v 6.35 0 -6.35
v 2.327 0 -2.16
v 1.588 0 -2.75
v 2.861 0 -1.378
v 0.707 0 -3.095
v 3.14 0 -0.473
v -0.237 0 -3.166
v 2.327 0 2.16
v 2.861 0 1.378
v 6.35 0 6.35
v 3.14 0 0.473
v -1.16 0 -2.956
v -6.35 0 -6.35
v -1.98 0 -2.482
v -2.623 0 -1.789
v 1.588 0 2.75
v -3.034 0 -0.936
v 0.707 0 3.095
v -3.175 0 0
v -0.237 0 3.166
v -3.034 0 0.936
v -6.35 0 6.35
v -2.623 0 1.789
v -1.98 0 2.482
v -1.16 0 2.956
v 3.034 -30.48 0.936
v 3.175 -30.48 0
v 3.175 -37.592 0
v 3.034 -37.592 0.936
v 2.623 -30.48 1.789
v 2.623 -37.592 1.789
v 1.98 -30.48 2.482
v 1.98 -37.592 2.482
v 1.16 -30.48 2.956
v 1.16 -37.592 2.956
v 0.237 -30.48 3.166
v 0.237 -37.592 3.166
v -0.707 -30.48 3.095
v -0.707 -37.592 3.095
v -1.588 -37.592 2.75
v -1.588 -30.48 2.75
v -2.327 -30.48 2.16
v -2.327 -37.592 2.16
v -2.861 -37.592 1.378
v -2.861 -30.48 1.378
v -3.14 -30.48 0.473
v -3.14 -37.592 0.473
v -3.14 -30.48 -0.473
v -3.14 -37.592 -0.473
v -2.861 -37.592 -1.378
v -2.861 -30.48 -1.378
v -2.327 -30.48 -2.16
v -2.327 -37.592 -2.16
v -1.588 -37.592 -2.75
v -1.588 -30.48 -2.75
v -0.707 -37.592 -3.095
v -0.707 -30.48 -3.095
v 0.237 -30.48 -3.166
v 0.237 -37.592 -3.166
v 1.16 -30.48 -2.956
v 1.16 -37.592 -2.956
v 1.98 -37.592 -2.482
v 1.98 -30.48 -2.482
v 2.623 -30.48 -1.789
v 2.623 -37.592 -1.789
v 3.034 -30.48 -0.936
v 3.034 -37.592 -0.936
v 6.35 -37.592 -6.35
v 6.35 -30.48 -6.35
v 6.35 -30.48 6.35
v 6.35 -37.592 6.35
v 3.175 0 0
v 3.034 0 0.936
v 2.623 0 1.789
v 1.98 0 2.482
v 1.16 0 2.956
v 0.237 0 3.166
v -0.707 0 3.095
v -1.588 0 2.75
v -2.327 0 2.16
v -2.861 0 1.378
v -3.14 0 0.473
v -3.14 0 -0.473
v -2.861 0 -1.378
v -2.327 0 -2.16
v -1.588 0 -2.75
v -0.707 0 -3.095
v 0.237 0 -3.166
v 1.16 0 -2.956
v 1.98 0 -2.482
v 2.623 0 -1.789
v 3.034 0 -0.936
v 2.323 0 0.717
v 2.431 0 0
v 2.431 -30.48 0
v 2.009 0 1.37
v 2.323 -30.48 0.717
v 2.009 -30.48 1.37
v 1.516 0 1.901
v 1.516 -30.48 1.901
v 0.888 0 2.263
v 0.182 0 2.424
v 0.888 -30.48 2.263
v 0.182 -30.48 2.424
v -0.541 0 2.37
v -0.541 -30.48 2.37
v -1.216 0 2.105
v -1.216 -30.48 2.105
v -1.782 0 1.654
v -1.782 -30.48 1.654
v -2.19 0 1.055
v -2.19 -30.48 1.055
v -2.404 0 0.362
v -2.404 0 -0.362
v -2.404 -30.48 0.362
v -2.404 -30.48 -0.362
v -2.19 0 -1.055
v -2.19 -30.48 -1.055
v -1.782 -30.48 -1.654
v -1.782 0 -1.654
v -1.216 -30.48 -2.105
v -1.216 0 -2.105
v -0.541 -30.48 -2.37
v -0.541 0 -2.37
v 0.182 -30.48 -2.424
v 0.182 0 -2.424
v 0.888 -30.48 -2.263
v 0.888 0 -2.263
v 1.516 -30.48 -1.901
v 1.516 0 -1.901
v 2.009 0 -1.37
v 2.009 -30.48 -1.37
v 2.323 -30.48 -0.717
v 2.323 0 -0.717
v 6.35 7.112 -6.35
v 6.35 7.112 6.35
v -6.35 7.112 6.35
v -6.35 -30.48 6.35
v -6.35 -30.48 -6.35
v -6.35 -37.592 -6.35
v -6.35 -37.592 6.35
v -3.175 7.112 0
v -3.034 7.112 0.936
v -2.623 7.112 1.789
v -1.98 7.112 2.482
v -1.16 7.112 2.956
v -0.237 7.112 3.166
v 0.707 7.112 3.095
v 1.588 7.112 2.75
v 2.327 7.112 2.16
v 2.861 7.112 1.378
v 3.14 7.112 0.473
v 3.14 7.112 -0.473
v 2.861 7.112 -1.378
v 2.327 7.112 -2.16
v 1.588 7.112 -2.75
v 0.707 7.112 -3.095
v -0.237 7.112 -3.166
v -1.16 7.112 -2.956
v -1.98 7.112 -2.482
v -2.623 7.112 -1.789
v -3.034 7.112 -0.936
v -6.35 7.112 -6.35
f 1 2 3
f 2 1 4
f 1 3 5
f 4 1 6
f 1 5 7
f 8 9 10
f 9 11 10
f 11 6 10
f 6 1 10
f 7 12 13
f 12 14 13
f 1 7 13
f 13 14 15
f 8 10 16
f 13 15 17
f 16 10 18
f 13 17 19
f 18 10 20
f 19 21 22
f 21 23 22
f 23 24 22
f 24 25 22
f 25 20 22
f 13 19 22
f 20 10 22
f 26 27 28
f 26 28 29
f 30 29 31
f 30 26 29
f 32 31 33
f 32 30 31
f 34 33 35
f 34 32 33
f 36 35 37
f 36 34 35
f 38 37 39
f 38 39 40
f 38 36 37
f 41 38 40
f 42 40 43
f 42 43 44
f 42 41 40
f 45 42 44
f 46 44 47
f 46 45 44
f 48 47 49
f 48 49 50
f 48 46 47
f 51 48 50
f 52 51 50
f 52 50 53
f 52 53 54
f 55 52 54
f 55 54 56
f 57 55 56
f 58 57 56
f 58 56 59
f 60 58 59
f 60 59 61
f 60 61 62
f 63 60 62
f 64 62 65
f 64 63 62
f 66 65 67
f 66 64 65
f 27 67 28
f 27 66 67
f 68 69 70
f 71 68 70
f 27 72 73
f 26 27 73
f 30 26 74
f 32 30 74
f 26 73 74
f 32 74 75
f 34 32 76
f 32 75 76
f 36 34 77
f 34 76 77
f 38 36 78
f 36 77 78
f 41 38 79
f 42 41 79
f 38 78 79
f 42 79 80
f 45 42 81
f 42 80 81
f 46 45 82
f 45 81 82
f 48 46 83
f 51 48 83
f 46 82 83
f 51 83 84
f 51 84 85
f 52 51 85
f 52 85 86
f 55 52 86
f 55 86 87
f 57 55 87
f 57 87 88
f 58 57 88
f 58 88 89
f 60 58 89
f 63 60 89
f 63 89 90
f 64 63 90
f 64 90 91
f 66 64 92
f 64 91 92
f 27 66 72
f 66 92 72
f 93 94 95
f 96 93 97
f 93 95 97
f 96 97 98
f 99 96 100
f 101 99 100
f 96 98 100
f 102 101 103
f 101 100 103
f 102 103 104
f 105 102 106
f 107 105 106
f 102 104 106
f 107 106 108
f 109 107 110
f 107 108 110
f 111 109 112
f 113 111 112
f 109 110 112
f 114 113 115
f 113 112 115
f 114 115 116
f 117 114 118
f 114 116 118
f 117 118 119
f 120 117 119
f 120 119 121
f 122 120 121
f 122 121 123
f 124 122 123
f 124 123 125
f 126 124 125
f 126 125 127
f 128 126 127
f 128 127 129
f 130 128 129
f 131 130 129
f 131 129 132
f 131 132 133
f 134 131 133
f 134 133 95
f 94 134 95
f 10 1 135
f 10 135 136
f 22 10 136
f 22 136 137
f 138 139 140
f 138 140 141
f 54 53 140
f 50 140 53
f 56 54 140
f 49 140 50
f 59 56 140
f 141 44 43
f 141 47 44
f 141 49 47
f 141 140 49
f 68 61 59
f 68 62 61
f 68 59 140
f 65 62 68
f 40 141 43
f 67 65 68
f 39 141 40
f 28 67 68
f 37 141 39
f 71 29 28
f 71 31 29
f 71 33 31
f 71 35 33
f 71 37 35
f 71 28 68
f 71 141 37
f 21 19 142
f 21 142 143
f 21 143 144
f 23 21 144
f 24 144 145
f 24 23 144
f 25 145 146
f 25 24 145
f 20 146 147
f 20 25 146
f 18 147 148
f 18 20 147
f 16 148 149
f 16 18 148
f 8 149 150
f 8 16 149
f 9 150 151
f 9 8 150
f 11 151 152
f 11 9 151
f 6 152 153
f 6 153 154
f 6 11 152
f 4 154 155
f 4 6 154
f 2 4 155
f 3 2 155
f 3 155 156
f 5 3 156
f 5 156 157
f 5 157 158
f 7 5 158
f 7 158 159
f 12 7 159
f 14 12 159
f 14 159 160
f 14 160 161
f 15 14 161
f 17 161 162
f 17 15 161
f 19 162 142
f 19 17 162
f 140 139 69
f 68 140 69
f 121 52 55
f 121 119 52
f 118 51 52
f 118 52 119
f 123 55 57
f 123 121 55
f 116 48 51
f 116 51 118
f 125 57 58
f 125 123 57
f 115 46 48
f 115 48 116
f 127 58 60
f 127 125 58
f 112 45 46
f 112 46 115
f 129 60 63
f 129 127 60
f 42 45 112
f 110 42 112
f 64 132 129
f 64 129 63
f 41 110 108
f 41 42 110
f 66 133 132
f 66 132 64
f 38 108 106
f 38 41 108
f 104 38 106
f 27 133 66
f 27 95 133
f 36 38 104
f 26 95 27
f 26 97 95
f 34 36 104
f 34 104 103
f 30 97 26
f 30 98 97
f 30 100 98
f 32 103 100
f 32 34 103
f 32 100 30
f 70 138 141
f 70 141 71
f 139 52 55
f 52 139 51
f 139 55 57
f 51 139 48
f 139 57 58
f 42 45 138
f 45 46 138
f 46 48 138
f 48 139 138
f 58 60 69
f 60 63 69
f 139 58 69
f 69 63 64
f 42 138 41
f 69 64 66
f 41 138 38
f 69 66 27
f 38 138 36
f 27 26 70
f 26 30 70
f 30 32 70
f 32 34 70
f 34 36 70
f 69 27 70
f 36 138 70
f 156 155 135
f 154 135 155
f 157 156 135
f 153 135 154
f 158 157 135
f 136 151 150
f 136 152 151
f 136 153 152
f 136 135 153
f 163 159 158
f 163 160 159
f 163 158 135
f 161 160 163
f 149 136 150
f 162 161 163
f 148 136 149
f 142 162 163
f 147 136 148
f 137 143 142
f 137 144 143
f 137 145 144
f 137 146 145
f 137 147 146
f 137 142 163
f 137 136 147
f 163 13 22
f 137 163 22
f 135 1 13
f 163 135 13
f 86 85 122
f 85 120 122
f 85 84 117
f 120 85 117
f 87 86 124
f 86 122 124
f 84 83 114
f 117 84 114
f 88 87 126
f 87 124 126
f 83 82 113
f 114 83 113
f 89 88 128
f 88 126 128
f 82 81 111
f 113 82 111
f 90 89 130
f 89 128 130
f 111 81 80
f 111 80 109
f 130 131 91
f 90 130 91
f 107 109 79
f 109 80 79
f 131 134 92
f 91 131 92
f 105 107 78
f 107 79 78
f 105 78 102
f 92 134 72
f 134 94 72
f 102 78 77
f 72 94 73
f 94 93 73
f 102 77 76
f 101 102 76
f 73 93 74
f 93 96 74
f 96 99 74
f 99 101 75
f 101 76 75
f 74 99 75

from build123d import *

# Parameters (mm, degrees)
F0_R     = 3.175
F1_DEPTH = 30.48
F3_W     = 12.7
F3_H     = 12.7
F3_R     = 3.175
F4_DEPTH = 7.112
F5_W     = 12.7
F5_H     = 12.7
F5_R     = 3.175
F6_DEPTH = 7.112
F7_R     = 2.431195
F8_DEPTH = 43.688


with BuildPart() as f1:
    # F0 (on Front) → F1 (new body)
    with BuildSketch(Plane.XZ):
        Circle(F0_R)
    extrude(amount=F1_DEPTH)

    # F7 (on face) → F8 (cut)
    with BuildSketch(Plane.XZ.offset(30.48)):
        Circle(F7_R)
    extrude(amount=-F8_DEPTH, mode=Mode.SUBTRACT)


with BuildPart() as f4:
    # F3 (on face) → F4 (new body)
    with BuildSketch(Plane.XZ.offset(30.48)):
        Rectangle(F3_W, F3_H)
        Circle(F3_R, mode=Mode.SUBTRACT)
    extrude(amount=F4_DEPTH)


with BuildPart() as f6:
    # F5 (on face) → F6 (new body)
    with BuildSketch(Plane(origin=(0, 0, 0), x_dir=(-1, 0, 0), z_dir=(0, 1, 0))):
        Rectangle(F5_W, F5_H)
        Circle(F5_R, mode=Mode.SUBTRACT)
    extrude(amount=F6_DEPTH)


solid = Compound([f1.part, f4.part, f6.part])
